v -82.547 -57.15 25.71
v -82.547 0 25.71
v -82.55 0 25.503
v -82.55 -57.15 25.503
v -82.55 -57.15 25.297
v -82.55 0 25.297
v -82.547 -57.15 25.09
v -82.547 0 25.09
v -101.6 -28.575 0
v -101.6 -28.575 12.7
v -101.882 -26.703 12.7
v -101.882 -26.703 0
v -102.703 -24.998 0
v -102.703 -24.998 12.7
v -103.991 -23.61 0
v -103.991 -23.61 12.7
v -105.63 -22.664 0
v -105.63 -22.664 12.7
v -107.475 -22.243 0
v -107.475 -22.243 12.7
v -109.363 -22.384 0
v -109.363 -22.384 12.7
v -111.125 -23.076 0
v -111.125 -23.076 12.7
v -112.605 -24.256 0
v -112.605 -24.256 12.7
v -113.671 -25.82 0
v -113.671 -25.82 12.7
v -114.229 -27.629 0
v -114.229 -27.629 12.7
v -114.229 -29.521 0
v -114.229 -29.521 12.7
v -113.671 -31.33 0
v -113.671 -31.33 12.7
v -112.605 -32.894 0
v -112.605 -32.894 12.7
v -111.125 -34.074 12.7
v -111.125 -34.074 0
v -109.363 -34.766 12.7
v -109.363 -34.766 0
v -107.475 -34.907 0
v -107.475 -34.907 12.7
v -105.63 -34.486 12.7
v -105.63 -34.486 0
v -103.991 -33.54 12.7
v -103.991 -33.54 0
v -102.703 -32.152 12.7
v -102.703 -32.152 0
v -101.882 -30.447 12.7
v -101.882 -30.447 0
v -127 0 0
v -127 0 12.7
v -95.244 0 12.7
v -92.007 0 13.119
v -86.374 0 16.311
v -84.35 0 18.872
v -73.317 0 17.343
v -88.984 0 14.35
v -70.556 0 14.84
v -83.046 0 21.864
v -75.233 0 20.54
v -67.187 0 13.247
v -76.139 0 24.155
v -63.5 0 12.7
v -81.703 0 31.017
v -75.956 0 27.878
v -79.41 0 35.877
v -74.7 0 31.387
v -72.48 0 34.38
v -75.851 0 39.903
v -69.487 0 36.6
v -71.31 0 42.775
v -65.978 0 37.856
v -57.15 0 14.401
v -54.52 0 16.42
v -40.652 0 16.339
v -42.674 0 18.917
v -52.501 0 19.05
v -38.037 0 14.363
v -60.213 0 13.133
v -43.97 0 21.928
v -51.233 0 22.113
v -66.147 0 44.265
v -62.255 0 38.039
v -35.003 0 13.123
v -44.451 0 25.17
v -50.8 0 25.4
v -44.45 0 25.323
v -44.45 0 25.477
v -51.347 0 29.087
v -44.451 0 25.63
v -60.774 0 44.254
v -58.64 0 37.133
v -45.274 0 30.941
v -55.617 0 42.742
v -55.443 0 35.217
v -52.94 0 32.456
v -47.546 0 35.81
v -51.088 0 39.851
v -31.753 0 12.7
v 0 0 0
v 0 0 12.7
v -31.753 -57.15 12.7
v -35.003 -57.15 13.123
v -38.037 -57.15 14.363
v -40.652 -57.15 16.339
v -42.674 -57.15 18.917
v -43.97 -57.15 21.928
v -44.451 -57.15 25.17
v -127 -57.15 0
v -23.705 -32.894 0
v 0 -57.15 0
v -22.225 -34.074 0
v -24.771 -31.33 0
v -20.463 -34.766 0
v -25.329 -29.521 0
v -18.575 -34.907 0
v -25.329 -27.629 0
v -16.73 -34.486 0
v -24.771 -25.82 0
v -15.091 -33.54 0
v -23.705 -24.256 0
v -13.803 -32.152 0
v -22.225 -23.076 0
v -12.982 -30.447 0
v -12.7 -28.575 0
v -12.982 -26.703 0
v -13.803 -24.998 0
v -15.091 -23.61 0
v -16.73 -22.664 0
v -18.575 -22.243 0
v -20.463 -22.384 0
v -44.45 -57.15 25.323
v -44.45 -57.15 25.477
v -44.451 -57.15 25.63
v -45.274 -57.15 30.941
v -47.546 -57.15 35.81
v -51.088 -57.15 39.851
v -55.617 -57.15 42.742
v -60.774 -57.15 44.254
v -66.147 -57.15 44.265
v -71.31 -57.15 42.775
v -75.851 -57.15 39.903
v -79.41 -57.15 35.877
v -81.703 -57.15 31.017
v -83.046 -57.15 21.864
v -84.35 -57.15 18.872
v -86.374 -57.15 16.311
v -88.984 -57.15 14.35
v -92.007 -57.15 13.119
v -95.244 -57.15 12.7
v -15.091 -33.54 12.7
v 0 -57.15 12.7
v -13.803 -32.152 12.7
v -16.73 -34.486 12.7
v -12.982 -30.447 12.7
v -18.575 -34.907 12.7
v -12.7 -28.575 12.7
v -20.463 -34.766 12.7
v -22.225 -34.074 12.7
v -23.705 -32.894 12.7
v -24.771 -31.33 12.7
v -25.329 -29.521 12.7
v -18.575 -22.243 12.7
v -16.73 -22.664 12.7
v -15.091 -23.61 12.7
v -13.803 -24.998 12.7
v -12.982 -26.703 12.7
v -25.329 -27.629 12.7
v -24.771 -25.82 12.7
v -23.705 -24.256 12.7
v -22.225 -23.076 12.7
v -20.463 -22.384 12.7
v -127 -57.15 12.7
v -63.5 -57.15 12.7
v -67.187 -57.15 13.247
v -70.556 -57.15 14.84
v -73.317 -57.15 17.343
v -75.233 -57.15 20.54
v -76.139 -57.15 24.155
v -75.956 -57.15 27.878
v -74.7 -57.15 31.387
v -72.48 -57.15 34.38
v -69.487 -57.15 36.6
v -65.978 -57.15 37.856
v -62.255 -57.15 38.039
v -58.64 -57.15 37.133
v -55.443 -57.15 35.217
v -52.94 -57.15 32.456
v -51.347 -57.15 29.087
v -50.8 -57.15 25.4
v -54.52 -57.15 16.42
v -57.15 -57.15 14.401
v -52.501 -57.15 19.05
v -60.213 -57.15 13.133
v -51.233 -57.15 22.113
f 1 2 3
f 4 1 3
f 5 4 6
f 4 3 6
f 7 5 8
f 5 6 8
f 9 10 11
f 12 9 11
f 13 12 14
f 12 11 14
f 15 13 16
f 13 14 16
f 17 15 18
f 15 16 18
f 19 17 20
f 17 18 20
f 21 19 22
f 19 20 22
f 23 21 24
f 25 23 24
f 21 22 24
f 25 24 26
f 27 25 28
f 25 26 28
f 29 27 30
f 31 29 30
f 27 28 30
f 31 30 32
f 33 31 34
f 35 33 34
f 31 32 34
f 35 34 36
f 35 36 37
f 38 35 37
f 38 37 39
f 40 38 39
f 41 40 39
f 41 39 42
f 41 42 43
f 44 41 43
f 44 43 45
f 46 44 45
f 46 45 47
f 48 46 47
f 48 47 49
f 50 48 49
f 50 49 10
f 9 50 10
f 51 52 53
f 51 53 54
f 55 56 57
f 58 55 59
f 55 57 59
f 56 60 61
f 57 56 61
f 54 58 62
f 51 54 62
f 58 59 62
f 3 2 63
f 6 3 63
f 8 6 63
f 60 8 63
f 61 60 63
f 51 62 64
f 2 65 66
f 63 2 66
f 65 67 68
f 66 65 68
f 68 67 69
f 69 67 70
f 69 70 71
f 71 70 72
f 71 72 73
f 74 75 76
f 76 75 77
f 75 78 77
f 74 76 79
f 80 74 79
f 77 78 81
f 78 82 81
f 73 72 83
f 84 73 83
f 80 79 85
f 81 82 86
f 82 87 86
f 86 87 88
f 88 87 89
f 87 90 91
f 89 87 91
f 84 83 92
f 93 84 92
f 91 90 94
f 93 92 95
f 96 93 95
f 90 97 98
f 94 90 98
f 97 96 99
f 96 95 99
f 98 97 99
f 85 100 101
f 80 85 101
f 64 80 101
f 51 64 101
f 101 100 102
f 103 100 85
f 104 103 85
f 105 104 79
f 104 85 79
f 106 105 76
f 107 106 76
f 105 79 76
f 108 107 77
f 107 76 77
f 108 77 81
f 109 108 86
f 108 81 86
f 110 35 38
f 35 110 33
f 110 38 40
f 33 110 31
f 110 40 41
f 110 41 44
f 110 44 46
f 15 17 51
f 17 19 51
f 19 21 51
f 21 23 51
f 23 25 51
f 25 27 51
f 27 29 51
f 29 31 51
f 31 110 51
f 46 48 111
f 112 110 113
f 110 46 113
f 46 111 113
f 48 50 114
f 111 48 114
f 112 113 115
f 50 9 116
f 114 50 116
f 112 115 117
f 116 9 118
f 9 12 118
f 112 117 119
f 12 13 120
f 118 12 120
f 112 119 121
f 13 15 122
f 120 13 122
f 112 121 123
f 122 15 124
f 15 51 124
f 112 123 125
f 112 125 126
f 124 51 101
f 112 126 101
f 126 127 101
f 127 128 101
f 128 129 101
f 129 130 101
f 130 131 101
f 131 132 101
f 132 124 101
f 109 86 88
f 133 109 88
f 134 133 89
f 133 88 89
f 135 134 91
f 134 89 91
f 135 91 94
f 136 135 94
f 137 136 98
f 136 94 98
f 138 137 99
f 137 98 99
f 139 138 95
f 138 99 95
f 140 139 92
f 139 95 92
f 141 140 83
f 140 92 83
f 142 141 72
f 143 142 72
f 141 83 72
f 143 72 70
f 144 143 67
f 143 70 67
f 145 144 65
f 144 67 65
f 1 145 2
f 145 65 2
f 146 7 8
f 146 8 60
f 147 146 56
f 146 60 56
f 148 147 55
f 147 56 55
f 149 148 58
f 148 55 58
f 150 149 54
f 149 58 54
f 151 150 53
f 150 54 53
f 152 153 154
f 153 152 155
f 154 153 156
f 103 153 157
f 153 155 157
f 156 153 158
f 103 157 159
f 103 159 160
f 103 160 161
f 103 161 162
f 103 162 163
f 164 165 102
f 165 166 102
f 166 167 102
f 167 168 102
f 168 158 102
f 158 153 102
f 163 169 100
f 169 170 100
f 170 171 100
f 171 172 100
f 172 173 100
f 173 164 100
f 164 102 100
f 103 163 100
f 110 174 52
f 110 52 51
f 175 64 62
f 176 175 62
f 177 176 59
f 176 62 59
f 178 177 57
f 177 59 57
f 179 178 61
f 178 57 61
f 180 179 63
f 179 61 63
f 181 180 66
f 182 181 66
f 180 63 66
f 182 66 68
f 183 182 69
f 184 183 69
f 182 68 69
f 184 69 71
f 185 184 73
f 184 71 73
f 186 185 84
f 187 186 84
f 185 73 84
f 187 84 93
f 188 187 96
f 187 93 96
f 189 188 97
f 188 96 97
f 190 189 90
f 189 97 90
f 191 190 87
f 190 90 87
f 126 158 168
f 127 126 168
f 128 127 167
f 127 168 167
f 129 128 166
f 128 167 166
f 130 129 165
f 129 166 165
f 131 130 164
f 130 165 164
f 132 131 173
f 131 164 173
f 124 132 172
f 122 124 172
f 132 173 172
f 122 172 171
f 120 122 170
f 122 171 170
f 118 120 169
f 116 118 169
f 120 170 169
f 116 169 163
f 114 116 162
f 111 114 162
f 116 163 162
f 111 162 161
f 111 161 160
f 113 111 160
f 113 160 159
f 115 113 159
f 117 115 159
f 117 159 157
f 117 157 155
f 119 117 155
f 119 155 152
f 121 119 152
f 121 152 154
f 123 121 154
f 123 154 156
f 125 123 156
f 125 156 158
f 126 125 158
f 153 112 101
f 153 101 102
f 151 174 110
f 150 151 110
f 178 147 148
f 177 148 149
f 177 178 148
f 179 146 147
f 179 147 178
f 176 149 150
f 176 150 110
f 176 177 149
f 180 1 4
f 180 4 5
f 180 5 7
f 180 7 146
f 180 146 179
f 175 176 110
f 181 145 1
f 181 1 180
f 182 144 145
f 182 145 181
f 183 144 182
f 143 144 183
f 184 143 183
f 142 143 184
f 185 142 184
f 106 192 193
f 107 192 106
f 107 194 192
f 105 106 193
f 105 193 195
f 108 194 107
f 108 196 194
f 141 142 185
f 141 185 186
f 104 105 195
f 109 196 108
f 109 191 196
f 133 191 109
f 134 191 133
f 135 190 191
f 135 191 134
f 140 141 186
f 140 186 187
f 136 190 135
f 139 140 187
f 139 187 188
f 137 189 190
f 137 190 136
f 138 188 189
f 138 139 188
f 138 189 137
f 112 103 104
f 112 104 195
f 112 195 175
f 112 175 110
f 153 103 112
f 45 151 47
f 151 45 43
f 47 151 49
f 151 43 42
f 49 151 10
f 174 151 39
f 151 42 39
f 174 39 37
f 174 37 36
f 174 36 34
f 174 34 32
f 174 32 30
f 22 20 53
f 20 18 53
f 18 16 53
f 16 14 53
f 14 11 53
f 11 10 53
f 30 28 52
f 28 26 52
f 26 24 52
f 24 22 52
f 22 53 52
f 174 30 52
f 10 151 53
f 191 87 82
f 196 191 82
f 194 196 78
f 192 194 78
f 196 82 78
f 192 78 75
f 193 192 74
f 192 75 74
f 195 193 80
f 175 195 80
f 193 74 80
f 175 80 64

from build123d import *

# Parameters (mm, degrees)
F1_DEPTH  = 57.15
F2_R      = 6.35
F3_DEPTH  = 25.4
F3_FACE_R = 6.35
F4_DEPTH  = 25.401


with BuildPart() as f1:
    # F0 (on Front) → F1 (new body)
    with BuildSketch(Plane.XZ):
        Polygon((-127, 0), (0, 0), (0, 12.7), (-31.753481, 12.7), (-63.5, 12.7), (-95.243674, 12.7), (-127, 12.7), align=None)
        with BuildLine():
            Line((-63.5, 12.7), (-31.753481, 12.7))
            ThreePointArc((-31.753481, 12.7), (-40.651931, 16.338676), (-44.451393, 25.169669))
            ThreePointArc((-44.451393, 25.169669), (-44.453481, 25.4), (-44.451393, 25.630331))
            ThreePointArc((-44.451393, 25.630331), (-63.459927, 44.449958), (-82.54747, 25.71047))
            ThreePointArc((-82.54747, 25.71047), (-82.543674, 25.4), (-82.54747, 25.08953))
            ThreePointArc((-82.54747, 25.08953), (-86.373865, 16.310639), (-95.243674, 12.7))
            Line((-95.243674, 12.7), (-63.5, 12.7))
        make_face()
        with BuildLine():
            ThreePointArc((-50.8, 25.4), (-54.519744, 16.419744), (-63.5, 12.7))
            ThreePointArc((-63.5, 12.7), (-72.480256, 34.380256), (-50.8, 25.4))
        make_face(mode=Mode.SUBTRACT)
        with BuildLine():
            ThreePointArc((-44.451393, 25.630331), (-44.453481, 25.4), (-44.451393, 25.169669))
            ThreePointArc((-44.451393, 25.169669), (-44.45, 25.4), (-44.451393, 25.630331))
        make_face()
        with BuildLine():
            ThreePointArc((-82.54747, 25.71047), (-82.55, 25.4), (-82.54747, 25.08953))
            ThreePointArc((-82.54747, 25.08953), (-82.543674, 25.4), (-82.54747, 25.71047))
        make_face()
    extrude(amount=F1_DEPTH)

    # F2 (on Top) → F3 (join)
    with BuildSketch(Plane.XY):
        with Locations((-19.05, -28.575)):
            Circle(F2_R)
        with Locations((-107.95, -28.575)):
            Circle(F2_R)
    extrude(amount=F3_DEPTH)

    # F3_face (on face) → F4 (cut, through all)
    with BuildSketch(Plane(origin=(-107.95, -28.575, 25.4), x_dir=(1, 0, 0), z_dir=(0, 0, 1))):
        Circle(F3_FACE_R)
        with Locations((88.9, 0)):
            Circle(F3_FACE_R)
    extrude(amount=-F4_DEPTH, mode=Mode.SUBTRACT)


solid = f1.part
